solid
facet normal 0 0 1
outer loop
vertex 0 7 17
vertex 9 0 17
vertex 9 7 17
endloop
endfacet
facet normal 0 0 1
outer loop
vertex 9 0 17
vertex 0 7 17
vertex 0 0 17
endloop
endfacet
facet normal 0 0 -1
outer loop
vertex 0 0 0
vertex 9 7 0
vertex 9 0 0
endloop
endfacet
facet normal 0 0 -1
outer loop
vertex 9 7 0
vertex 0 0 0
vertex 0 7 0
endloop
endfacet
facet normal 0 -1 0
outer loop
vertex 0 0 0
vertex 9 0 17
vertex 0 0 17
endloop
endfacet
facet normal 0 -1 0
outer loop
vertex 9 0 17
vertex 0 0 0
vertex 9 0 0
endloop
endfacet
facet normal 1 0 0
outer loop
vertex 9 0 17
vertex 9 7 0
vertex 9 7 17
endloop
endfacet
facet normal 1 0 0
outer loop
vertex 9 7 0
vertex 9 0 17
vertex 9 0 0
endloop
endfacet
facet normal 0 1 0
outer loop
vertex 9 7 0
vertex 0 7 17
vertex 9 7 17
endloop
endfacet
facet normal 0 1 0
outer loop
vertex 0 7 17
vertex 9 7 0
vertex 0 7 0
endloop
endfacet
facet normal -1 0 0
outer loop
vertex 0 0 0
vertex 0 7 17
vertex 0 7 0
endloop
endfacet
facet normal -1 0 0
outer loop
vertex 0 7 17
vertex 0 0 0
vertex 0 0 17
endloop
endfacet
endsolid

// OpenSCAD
// Generated by SolidPython 1.0.1 on 2020-07-29 00:46:55


cube(size = [9, 7, 17]);
/***********************************************
*********      SolidPython code:      **********
************************************************
 
# import packages: SolidPython
from solid import *
from solid.utils import *
from itertools import chain, combinations, permutations


class Resize:

    def __init__(self, scad_file):
        self.scad_file = scad_file
        #self.scad_file = import_scad(scad_file)
        # cone/cylinder param:
        self.r1 = 0
        self.r2 = 0
        self.h = 0
        # rectangular prism param:
        self.w = 0
        self.l = 0
        # ellipse param:
        self.r = 0

    # import OpenScad code (file name corresponds to shape)


    # classify shape + parameters
    def assign(self, param1, param2, param3):
        if self.scad_file == 'cone.scad':
            self.r1 = param1
            self.r2 = param2
            self.h = param3
        elif self.scad_file == 'cylinder.scad':
            self.r1 = param1
            self.r2 = param2
            self.h = param3
        elif self.scad_file == 'rectangularPrism.scad':
            self.h = param1
            self.l = param2
            self.w = param3
        else:
            self.r = param1
            self.h = param2

    # resize parameters
    def iterate(self):
        x = range(3, 20, 2)
        i = 1
        if self.scad_file == 'cone.scad':
            tempList = list(permutations(x, 2))
            for temp in tempList:
                param1 = temp[0]
                param2 = temp[1]
                filepath = 'produced_scad_files/' + 'cone' + str(param1) + '_' + str(param2) + '_' + '.scad'
                scad_render_to_file(cylinder(h=param1, r1=param2, r2=0), filepath)

        elif self.scad_file == 'cylinder.scad':
            tempList = list(permutations(x, 3))
            for temp in tempList:
                param1 = temp[0]
                param2 = temp[1]
                filepath = 'produced_scad_files/' + 'cylinder' + str(param1) + '_' + str(param2) + '_' + '.scad'
                scad_render_to_file(cylinder(h=param1, r1=param2, r2=param2), filepath)

        elif self.scad_file == 'rectangularPrism.scad':
            tempList = list(permutations(x, 3))
            for temp in tempList:
                param1 = temp[0]
                param2 = temp[1]
                param3 = temp[2]
                filepath = 'produced_scad_files/' + 'rectangularPrism' + str(param1) + '_' + str(param2) + '_' + str(
                    param3) + '.scad'
                scad_render_to_file(cube(size=(param1, param2, param3)), filepath)

        elif self.scad_file == 'ellipse.scad':
            tempList = list(permutations(x, 4))
            for temp in tempList:
                param1 = temp[0]
                param2 = temp[1]
                param3 = temp[2]
                param4 = temp[3]
                filepath = 'produced_scad_files/' + 'ellipse' + str(param1) + '_' + str(param2) + '_' + str(param3) + '_' + str(param4) + '.scad'
                scad_render_to_file(scale([param1, param2, param3])(sphere(r=param4)), filepath)

    def render_to_scadfile(self):
        scad_render_to_file(scad, 'example.scad') 
 
************************************************/
